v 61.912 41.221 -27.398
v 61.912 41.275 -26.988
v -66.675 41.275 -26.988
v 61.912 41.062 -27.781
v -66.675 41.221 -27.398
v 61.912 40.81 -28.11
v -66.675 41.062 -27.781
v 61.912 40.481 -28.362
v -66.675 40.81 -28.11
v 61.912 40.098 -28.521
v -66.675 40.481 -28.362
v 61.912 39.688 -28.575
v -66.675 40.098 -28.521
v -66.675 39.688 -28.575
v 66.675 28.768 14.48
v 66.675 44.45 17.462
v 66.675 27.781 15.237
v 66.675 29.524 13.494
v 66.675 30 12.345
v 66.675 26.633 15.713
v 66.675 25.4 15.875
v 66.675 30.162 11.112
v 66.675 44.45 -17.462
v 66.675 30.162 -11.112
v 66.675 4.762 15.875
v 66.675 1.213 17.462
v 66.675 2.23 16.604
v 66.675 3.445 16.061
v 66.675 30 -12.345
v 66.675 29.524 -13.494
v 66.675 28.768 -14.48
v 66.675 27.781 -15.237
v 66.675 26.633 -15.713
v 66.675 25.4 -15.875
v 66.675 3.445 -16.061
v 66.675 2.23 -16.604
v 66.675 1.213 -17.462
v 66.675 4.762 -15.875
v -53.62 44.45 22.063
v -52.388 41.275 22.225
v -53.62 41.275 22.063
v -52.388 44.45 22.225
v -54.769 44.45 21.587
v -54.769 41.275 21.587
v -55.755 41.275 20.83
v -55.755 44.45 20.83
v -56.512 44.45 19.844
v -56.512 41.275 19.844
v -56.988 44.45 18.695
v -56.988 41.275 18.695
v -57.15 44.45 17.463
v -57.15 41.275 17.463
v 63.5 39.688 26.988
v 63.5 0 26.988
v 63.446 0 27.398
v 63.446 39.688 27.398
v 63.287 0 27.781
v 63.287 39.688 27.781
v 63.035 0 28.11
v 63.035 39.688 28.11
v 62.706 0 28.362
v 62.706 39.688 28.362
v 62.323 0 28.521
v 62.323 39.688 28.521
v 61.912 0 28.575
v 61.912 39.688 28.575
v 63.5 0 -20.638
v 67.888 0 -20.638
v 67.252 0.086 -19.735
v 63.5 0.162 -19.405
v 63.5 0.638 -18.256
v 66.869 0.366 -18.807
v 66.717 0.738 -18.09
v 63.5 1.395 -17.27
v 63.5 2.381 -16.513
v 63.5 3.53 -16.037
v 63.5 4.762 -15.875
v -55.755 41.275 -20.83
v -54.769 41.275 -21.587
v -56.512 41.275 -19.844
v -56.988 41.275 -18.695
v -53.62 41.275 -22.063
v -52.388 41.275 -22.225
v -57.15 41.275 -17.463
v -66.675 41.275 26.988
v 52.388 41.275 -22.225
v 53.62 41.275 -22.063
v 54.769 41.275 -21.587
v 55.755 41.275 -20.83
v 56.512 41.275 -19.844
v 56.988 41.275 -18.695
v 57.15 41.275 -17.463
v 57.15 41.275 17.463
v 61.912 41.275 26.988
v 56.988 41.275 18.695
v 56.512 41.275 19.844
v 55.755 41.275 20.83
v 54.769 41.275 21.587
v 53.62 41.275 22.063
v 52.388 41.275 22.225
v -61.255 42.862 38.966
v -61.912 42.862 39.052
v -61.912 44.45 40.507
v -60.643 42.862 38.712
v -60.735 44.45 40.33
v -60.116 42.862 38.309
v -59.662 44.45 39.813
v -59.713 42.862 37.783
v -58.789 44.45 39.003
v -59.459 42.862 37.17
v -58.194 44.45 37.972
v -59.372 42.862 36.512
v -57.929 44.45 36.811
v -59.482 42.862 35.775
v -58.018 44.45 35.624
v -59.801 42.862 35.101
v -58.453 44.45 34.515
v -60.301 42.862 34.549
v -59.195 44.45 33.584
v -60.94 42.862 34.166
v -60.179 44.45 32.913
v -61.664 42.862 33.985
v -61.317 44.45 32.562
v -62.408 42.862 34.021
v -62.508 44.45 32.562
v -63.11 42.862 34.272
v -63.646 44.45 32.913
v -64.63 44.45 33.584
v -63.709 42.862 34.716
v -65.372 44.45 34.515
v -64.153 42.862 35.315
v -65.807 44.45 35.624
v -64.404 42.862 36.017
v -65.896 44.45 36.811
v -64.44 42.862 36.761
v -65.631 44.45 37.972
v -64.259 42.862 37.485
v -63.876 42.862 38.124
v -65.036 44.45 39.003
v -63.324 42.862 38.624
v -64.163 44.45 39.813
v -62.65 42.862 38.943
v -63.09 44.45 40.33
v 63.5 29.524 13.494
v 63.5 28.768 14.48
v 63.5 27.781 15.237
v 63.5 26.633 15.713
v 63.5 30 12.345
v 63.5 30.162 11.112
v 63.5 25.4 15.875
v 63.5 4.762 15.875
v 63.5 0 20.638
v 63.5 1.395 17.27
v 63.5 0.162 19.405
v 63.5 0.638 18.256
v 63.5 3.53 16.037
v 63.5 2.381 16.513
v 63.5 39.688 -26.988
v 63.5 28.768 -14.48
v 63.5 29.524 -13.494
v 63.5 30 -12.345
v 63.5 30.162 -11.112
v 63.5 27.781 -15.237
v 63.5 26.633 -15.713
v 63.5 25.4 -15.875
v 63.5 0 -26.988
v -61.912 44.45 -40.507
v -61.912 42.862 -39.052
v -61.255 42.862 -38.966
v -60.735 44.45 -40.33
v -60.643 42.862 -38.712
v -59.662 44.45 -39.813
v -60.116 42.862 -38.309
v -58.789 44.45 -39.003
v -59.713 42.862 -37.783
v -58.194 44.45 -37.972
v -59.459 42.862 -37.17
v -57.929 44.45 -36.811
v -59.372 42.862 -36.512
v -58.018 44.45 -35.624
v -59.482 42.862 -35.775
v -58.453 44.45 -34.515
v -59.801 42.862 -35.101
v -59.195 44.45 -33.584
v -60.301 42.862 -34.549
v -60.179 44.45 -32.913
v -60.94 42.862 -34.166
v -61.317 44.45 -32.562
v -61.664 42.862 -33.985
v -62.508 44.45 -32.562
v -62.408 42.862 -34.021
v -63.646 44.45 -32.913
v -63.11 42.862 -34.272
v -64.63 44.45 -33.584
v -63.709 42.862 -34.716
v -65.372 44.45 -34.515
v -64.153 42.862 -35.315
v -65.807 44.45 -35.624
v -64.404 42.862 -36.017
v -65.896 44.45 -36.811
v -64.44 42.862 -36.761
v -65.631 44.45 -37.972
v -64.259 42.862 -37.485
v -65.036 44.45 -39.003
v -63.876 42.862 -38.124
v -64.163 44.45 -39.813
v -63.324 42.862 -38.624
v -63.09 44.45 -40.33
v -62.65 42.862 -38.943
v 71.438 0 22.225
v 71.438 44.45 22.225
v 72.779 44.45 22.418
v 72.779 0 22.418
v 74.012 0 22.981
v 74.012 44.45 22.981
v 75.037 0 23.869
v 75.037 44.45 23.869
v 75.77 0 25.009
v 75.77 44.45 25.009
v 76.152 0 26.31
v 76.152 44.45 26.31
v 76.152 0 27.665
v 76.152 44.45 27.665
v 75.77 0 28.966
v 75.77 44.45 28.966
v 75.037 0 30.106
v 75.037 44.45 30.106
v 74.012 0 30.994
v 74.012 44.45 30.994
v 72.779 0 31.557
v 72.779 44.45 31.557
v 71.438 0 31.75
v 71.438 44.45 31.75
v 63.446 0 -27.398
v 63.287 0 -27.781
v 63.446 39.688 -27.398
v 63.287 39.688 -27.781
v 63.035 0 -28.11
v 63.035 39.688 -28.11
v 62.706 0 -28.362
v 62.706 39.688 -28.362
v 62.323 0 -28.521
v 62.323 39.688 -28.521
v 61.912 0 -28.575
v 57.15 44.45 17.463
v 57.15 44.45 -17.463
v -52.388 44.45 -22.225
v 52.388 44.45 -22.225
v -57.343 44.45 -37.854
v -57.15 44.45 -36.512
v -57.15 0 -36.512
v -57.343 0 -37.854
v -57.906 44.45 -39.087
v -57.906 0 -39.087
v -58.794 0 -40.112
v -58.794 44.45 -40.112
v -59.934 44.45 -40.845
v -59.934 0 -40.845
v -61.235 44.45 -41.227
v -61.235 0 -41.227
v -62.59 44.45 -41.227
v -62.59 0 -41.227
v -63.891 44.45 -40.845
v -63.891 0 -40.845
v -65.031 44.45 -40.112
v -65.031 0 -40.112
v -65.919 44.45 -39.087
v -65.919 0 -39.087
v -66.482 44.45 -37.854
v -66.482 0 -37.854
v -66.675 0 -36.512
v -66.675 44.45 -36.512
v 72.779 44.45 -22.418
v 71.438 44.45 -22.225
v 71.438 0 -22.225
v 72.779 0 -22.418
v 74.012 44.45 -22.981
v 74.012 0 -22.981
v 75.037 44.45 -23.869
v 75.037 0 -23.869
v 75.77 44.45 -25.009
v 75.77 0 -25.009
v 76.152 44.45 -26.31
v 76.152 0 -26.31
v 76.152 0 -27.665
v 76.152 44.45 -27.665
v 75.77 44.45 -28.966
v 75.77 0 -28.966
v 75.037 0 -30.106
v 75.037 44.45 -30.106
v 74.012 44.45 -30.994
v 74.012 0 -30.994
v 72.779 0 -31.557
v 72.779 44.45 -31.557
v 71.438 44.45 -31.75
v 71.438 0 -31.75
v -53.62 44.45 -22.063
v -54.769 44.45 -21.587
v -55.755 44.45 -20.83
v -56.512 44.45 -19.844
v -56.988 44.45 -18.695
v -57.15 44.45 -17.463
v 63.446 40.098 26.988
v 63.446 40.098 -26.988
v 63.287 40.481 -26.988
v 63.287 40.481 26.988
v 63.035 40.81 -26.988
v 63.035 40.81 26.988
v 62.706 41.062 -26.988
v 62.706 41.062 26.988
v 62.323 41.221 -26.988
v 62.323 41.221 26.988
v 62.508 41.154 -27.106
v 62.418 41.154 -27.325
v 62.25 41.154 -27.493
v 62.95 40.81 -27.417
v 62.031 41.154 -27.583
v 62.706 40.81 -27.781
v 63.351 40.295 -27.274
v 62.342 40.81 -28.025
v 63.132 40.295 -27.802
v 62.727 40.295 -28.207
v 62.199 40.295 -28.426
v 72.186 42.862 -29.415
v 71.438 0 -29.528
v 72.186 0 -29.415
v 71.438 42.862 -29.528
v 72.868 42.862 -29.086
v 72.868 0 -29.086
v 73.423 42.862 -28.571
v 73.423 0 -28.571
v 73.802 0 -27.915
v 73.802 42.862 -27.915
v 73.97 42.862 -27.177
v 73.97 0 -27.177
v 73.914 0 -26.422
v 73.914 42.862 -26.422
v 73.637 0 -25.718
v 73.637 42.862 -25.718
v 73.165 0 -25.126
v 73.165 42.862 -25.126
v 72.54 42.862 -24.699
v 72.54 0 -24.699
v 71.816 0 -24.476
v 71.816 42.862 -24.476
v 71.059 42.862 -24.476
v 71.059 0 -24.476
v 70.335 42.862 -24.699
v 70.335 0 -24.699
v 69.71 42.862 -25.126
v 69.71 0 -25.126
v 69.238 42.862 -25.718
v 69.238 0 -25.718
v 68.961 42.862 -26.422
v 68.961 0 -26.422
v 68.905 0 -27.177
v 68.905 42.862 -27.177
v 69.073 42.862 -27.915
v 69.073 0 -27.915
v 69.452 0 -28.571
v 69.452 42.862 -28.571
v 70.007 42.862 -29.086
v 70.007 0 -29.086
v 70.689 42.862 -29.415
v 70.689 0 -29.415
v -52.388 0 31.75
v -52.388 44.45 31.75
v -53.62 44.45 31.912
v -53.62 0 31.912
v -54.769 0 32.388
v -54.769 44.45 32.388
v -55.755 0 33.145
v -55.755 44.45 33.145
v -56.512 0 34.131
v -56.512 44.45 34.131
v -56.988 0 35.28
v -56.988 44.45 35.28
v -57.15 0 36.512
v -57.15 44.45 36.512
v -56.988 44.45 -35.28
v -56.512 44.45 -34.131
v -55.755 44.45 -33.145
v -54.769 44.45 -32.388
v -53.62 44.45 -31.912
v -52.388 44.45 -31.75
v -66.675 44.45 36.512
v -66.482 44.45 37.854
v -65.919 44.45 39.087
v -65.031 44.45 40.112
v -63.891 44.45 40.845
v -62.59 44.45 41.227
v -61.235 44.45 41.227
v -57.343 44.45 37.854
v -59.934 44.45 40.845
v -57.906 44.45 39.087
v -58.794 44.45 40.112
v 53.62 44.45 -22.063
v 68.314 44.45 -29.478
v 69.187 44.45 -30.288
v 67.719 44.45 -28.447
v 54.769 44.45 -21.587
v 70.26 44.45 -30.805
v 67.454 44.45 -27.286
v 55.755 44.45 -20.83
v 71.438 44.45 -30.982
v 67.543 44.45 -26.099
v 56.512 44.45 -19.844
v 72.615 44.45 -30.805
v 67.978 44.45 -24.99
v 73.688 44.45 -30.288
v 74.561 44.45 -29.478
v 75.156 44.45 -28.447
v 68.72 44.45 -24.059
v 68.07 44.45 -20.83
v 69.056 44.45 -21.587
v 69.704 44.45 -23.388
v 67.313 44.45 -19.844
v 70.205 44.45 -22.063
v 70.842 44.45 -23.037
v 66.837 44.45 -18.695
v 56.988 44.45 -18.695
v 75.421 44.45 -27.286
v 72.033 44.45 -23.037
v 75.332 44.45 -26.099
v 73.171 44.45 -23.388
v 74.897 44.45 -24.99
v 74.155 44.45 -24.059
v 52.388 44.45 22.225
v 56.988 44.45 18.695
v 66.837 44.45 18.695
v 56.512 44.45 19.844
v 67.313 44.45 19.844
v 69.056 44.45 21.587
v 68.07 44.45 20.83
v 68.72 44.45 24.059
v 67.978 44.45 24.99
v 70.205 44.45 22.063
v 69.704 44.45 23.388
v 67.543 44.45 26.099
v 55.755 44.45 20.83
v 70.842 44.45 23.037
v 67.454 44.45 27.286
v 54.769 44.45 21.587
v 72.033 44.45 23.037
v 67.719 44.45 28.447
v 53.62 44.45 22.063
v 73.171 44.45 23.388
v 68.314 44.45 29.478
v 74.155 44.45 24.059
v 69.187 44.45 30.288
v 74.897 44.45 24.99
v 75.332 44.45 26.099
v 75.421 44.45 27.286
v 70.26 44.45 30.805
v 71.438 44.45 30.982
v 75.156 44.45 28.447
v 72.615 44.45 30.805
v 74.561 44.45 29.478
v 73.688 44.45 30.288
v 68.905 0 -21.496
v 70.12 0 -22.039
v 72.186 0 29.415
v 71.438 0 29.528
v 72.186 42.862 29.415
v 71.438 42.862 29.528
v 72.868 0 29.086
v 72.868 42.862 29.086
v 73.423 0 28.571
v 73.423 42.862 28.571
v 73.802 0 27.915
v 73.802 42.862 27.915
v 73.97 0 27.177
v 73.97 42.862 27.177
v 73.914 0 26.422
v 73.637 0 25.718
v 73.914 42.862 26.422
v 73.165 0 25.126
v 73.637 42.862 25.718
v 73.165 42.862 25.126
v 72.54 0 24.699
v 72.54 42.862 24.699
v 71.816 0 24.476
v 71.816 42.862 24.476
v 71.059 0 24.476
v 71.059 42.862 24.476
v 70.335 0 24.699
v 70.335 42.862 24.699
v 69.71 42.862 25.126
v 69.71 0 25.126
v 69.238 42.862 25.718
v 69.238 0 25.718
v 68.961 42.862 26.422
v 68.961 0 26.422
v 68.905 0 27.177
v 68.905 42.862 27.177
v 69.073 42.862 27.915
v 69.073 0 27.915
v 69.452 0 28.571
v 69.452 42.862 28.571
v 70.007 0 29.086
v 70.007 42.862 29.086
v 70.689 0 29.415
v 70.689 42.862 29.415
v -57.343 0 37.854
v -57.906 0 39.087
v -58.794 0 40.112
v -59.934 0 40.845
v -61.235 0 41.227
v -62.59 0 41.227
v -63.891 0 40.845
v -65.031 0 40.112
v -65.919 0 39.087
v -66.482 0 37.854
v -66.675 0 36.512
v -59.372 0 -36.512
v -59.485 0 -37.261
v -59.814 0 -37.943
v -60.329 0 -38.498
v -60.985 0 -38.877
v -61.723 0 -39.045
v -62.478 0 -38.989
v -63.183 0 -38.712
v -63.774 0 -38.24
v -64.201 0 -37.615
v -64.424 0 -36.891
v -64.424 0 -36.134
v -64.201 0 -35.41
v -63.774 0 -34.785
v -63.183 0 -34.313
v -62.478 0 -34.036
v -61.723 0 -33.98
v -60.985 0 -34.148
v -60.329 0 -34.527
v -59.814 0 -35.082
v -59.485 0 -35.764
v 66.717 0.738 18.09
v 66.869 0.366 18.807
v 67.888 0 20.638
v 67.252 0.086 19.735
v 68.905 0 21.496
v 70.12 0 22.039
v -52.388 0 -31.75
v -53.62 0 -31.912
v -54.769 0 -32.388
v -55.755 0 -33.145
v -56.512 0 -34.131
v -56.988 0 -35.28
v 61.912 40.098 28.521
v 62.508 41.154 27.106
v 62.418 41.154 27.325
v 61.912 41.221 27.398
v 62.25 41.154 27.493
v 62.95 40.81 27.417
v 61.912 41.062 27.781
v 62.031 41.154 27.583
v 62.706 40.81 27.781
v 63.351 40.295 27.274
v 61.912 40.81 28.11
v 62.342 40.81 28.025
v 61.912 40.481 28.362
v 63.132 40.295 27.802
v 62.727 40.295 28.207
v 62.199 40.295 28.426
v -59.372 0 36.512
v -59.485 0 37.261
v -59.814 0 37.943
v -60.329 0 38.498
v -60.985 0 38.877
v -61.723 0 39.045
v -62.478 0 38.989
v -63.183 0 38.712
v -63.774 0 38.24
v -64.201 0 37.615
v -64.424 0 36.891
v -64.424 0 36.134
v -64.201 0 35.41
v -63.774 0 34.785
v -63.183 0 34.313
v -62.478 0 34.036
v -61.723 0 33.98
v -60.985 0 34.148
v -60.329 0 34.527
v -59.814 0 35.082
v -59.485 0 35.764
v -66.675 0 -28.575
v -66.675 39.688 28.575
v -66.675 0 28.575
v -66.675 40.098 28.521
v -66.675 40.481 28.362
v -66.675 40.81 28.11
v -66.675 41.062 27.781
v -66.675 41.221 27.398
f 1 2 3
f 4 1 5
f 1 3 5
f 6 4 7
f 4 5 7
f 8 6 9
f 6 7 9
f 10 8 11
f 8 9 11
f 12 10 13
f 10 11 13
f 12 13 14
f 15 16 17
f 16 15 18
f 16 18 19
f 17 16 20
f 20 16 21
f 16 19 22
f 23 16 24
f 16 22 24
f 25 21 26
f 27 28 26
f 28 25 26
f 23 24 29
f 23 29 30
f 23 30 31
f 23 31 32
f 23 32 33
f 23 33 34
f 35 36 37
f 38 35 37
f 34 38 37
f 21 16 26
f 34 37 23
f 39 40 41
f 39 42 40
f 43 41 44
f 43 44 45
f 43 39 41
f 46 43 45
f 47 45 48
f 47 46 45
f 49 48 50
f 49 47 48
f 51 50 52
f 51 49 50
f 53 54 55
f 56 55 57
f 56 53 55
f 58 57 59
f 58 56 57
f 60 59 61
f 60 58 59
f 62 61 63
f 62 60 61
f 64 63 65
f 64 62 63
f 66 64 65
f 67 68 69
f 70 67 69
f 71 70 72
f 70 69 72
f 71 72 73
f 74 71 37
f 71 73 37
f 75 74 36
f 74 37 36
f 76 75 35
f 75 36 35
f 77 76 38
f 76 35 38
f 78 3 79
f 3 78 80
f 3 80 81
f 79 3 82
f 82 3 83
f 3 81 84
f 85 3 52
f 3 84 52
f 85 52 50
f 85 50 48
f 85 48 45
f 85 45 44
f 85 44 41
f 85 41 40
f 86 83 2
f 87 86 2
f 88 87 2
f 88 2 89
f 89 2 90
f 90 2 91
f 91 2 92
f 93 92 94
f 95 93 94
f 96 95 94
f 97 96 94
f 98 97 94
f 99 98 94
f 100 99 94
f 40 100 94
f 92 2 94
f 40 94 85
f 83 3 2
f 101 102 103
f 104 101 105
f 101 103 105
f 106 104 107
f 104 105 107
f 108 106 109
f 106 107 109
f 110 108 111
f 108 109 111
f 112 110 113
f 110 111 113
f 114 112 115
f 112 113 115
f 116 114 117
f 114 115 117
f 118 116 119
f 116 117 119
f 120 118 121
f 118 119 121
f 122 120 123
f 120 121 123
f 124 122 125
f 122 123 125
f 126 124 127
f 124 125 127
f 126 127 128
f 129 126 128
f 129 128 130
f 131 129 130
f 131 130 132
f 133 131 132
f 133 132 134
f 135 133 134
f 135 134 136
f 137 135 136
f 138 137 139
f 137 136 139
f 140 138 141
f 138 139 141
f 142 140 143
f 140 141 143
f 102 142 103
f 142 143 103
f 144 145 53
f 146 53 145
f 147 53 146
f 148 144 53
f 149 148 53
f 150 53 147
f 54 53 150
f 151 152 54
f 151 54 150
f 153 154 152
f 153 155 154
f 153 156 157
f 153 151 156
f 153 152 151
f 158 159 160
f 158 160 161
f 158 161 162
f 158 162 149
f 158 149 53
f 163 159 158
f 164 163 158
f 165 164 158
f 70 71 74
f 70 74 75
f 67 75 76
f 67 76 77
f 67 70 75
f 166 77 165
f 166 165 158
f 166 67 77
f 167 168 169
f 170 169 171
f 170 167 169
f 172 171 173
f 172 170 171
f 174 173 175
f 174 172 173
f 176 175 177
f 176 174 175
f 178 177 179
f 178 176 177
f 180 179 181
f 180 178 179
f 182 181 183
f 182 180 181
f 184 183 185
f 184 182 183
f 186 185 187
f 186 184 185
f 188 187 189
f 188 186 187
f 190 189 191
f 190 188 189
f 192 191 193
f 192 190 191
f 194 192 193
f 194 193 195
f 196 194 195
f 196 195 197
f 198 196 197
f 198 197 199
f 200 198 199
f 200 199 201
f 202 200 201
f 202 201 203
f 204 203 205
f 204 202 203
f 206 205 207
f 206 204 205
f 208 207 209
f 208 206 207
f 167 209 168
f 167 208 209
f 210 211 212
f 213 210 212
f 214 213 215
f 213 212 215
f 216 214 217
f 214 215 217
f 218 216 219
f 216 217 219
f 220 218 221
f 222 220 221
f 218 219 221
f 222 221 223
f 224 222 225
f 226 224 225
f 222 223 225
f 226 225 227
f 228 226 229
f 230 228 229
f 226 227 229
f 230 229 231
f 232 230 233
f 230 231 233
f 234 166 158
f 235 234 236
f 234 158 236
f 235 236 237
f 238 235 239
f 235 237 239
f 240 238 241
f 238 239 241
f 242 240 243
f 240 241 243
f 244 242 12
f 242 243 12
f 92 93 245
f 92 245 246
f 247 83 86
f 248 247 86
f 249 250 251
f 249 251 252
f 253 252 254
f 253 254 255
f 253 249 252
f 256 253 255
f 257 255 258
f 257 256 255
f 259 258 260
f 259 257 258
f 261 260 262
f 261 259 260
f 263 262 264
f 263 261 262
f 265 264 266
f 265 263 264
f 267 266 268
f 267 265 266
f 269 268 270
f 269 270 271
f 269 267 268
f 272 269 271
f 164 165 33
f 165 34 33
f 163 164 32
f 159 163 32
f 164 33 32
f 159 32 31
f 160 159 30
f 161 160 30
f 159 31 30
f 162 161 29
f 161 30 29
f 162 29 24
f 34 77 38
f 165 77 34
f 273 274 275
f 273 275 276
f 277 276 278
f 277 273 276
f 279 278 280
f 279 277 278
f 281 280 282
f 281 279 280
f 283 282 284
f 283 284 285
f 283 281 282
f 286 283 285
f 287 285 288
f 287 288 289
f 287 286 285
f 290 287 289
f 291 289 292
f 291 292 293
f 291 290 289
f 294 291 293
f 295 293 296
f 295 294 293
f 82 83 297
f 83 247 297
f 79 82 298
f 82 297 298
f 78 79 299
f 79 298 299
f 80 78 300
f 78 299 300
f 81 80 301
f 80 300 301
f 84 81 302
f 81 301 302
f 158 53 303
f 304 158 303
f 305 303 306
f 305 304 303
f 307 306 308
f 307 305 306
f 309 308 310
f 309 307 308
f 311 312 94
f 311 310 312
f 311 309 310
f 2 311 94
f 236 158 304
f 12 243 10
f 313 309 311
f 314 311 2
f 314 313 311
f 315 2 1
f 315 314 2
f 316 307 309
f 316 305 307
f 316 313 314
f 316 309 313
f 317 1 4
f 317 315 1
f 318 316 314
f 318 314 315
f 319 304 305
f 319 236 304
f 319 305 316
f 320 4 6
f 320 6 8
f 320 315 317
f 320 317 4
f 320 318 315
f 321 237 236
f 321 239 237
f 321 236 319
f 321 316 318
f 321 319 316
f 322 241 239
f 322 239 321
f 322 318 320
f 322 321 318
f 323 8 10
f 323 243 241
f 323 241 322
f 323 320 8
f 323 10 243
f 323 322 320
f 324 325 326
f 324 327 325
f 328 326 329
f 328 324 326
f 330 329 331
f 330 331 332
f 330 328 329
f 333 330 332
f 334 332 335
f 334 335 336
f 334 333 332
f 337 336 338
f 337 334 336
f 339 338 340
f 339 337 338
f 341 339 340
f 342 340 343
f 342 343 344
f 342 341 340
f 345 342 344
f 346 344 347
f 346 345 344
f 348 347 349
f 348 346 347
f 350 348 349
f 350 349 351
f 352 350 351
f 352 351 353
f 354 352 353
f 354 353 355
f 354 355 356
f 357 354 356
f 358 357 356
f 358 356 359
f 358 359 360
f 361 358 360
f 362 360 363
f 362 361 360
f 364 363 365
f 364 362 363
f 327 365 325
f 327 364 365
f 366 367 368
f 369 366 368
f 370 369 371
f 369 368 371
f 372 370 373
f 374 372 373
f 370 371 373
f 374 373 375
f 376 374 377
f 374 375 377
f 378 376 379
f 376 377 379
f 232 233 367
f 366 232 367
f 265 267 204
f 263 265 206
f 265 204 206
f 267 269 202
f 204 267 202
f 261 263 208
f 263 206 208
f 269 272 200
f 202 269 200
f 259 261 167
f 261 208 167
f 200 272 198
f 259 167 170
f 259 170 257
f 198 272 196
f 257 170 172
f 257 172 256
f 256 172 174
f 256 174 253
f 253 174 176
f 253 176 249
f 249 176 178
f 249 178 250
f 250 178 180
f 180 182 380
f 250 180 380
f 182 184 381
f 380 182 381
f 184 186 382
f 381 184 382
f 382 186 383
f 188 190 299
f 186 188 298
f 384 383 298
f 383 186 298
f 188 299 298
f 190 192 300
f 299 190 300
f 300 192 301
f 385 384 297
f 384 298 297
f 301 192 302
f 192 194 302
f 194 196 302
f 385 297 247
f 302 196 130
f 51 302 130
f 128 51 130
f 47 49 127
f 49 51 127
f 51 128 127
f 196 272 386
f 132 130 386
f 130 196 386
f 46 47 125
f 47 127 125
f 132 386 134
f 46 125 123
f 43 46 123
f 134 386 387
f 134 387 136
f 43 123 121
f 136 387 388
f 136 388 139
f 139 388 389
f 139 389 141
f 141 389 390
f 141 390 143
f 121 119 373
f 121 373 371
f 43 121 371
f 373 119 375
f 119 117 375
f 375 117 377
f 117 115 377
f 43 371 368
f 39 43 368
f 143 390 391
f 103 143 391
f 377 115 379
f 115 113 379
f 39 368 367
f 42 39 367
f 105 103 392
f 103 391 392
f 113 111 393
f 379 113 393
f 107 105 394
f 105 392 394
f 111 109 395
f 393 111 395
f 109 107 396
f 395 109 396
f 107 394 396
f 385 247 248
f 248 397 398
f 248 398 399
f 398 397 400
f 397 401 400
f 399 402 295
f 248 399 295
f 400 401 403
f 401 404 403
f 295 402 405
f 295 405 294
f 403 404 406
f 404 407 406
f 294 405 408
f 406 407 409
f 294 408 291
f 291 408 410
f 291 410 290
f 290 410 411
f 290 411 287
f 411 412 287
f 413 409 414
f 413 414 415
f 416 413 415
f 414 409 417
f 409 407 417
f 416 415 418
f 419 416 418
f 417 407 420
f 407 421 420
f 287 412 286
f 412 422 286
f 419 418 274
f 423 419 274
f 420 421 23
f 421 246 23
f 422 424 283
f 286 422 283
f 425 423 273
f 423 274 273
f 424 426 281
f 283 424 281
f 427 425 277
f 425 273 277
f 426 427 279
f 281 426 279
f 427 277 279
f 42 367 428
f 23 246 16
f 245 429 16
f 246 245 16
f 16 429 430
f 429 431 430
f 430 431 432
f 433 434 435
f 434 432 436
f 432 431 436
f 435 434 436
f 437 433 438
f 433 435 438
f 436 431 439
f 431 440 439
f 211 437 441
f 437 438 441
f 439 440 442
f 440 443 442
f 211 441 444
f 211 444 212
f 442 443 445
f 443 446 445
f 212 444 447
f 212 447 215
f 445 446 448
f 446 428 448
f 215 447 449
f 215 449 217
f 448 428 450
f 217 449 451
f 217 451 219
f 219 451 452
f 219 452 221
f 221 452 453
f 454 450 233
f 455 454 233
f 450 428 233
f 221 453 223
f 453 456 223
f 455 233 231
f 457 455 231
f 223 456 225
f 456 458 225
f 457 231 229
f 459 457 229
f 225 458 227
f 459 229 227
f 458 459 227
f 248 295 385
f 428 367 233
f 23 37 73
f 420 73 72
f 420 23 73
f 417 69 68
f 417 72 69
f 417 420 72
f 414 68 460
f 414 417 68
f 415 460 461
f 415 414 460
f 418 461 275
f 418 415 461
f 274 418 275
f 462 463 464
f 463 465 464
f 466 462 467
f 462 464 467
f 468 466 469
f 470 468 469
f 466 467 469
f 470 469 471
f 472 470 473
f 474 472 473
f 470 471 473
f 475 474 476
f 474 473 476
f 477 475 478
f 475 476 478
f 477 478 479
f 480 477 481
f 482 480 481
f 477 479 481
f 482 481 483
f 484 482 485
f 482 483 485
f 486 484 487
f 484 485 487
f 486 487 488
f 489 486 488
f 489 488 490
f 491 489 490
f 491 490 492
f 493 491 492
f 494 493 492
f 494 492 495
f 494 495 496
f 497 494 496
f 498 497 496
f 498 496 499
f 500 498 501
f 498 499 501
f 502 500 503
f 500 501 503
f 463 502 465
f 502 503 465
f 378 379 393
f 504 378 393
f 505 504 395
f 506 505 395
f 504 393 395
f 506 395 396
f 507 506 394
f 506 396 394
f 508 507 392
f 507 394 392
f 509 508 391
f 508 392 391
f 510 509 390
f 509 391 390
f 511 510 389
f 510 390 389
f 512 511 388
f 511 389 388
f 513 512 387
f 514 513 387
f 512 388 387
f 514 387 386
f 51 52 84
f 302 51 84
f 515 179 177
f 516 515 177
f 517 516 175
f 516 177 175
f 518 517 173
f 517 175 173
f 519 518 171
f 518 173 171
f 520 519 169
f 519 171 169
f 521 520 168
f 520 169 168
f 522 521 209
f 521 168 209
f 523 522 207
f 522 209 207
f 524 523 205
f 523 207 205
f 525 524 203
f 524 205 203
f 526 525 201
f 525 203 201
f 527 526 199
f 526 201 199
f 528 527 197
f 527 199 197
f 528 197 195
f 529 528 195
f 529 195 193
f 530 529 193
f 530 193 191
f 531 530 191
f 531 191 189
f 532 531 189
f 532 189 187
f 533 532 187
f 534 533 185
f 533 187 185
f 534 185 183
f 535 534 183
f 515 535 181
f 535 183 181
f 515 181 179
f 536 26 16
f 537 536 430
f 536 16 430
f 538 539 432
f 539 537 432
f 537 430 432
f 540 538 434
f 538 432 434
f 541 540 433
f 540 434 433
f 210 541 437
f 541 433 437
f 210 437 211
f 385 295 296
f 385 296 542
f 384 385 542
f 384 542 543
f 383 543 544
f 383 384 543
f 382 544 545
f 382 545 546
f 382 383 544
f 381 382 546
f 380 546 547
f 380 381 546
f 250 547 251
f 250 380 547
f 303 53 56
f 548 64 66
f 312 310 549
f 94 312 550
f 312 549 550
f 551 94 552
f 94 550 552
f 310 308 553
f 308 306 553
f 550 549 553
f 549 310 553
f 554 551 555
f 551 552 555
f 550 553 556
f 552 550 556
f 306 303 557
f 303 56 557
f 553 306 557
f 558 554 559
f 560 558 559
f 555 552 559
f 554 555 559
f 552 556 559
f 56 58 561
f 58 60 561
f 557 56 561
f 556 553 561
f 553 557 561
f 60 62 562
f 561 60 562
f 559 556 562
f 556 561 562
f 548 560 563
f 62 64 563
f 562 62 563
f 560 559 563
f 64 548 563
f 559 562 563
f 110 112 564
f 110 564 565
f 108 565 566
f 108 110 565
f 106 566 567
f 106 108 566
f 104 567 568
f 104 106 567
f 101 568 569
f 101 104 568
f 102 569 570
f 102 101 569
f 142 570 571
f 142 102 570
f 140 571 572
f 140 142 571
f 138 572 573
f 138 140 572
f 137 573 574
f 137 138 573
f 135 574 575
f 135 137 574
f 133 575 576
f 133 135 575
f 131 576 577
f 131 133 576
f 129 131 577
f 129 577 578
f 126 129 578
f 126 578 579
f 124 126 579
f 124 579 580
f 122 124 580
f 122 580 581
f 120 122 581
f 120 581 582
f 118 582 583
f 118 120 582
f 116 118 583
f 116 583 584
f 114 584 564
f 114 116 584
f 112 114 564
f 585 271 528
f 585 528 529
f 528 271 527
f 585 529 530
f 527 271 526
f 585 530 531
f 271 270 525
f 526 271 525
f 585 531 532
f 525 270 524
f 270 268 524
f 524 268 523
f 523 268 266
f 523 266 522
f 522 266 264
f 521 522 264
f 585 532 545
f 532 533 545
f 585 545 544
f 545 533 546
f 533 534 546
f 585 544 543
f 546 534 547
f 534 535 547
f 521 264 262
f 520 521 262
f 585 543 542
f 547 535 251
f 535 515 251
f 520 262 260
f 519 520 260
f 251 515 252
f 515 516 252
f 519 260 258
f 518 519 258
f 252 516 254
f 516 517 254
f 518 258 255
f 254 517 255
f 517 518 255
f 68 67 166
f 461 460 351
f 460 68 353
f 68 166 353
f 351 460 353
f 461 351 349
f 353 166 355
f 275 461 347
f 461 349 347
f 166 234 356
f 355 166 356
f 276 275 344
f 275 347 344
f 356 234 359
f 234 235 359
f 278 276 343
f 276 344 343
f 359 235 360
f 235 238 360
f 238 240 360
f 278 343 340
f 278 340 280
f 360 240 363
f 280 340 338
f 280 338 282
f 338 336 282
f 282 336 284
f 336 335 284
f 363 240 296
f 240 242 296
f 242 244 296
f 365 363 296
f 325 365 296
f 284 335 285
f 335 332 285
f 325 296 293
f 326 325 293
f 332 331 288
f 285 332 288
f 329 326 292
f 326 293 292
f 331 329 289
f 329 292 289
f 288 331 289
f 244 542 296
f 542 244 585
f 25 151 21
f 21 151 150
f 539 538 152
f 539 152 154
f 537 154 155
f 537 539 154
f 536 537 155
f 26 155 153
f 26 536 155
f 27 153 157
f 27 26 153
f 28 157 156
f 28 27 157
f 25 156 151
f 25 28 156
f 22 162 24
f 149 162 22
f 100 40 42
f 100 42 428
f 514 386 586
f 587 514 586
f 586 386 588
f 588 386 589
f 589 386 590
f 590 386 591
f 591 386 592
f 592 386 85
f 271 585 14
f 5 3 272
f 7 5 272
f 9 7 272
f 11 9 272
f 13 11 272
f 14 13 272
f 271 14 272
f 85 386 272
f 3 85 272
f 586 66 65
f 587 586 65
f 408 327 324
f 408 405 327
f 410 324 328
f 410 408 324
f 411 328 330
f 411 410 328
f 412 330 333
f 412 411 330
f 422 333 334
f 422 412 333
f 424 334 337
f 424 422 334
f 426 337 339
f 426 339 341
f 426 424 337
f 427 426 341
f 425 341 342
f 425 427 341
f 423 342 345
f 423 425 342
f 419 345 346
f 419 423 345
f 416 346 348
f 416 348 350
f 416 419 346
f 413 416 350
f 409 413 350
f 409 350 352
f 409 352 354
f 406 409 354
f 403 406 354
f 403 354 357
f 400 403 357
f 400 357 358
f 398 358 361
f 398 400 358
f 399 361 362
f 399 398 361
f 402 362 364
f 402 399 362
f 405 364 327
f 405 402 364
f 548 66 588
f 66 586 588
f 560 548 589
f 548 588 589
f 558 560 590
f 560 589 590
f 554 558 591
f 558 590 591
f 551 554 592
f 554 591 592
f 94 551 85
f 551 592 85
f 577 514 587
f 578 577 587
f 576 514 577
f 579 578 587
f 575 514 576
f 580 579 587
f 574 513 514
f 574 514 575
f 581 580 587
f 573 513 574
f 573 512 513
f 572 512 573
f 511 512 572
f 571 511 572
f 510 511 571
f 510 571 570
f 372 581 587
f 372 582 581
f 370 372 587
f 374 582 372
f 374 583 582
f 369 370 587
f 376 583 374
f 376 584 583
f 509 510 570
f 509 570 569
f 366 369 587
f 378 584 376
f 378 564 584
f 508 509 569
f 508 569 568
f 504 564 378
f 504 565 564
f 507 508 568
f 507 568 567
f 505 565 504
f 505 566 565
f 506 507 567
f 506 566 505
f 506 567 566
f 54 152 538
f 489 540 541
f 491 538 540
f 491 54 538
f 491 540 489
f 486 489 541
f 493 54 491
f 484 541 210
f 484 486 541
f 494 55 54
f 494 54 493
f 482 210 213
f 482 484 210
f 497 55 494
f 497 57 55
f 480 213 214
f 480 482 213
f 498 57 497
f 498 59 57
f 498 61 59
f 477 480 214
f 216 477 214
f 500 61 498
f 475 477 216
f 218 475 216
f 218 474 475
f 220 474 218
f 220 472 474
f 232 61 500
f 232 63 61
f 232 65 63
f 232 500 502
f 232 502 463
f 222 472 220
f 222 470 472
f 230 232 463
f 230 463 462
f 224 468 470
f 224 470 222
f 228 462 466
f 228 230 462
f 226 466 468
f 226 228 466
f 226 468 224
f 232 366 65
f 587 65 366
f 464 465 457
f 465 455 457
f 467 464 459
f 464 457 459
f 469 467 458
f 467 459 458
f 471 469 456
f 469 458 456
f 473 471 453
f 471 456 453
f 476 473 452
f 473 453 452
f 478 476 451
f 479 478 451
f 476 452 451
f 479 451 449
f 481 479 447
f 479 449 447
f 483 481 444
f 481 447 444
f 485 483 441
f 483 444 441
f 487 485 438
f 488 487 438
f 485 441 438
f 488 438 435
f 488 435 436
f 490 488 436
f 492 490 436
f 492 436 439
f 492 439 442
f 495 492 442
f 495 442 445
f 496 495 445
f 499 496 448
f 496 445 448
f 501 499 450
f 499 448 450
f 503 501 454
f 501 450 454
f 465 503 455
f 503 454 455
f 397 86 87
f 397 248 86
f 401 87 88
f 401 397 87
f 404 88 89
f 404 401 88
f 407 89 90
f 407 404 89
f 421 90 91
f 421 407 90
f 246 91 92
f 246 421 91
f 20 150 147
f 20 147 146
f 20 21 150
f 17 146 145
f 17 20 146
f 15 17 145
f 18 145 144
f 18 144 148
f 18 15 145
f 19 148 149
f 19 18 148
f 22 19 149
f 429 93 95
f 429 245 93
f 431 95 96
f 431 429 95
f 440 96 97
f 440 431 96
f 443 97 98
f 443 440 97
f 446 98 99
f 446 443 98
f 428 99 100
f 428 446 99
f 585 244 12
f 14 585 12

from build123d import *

# Parameters (mm, degrees)
SKETCH1_W           = 133.35
SKETCH1_H           = 63.5
SKETCH1_W_2         = 127
SKETCH1_H_2         = 57.15
BOSS_EXTRUDE1_DEPTH = 41.275
SKETCH2_W           = 31.75
SKETCH2_H           = 60.325
CUT_EXTRUDE1_DEPTH  = 134.35
SKETCH3_W           = 133.35
SKETCH3_H           = 63.5
SKETCH3_W_2         = 114.3
SKETCH3_H_2         = 44.45
BOSS_EXTRUDE2_DEPTH = 3.175
BOSS_EXTRUDE3_DEPTH = 44.45
SKETCH6_R           = 2.54
BOSS_EXTRUDE4_DEPTH = 44.45
CUT_EXTRUDE2_DEPTH  = 4.175
FILLET1_R           = 1.5875
FILLET2_R           = 4.7625


with BuildPart() as part:
    # Sketch1 → Boss-Extrude1 (new body)
    with BuildSketch(Plane(origin=(0, 0, 0), x_dir=(1, 0, 0), z_dir=(0, 1, 0))):
        Rectangle(SKETCH1_W, SKETCH1_H)
        Rectangle(SKETCH1_W_2, SKETCH1_H_2, mode=Mode.SUBTRACT)
    extrude(amount=BOSS_EXTRUDE1_DEPTH)

    # Sketch2 → Cut-Extrude1 (cut, through all)
    with BuildSketch(Plane.ZY.offset(66.675)):
        Rectangle(SKETCH2_W, SKETCH2_H)
    extrude(amount=-CUT_EXTRUDE1_DEPTH, mode=Mode.SUBTRACT)

    # Sketch3 → Boss-Extrude2 (add)
    with BuildSketch(Plane(origin=(0, 41.275, 0), x_dir=(1, 0, 0), z_dir=(0, 1, 0))):
        Rectangle(SKETCH3_W, SKETCH3_H)
        Rectangle(SKETCH3_W_2, SKETCH3_H_2, mode=Mode.SUBTRACT)
    extrude(amount=BOSS_EXTRUDE2_DEPTH)

    # Sketch4 → Boss-Extrude3 (add)
    with BuildSketch(Plane(origin=(0, 44.45, 0), x_dir=(1, 0, 0), z_dir=(0, 1, 0))):
        with BuildLine():
            Line((71.4375, 31.75), (66.675, 31.75))
            Line((66.675, 31.75), (66.675, 17.4625))
            ThreePointArc((66.675, 17.4625), (68.069903955, 20.830096045), (71.4375, 22.225))
            ThreePointArc((71.4375, 22.225), (76.2, 26.9875), (71.4375, 31.75))
        make_face()
    boss_extrude3 = extrude(amount=-BOSS_EXTRUDE3_DEPTH)

    # Sketch5 → Cut-Revolve1 (revolve, cut)
    with BuildSketch(Plane.YZ.offset(71.4375)):
        Polygon((0, -29.5275), (42.8625, -29.5275), (44.45, -30.982175739), (44.45, -26.9875), (0, -26.9875), align=None)
    cut_revolve1 = revolve(axis=Axis((71.4375, 44.45, -26.9875), (0, -1, 0)), mode=Mode.SUBTRACT)

    # Sketch6 → Boss-Extrude4 (add)
    with BuildSketch(Plane(origin=(0, 44.45, 0), x_dir=(1, 0, 0), z_dir=(0, 1, 0))):
        with BuildLine():
            Line((-66.675, 36.5125), (-66.675, 31.75))
            Line((-66.675, 31.75), (-52.3875, 31.75))
            ThreePointArc((-52.3875, 31.75), (-55.755096045, 33.144903955), (-57.15, 36.5125))
            ThreePointArc((-57.15, 36.5125), (-61.9125, 41.275), (-66.675, 36.5125))
        make_face()
        with Locations((-61.9125, 36.5125)):
            Circle(SKETCH6_R, mode=Mode.SUBTRACT)
    boss_extrude4 = extrude(amount=-BOSS_EXTRUDE4_DEPTH)

    # Sketch7 → Cut-Revolve2 (revolve, cut)
    with BuildSketch(Plane(origin=(-61.9125, 0, 0), x_dir=(0, 1, 0), z_dir=(-1, 0, 0))):
        Polygon((42.8625, 39.0525), (44.45, 40.507175739), (44.45, 36.5125), (42.8625, 36.5125), align=None)
    cut_revolve2 = revolve(axis=Axis((-61.9125, 42.8625, -36.5125), (0, -1, 0)), mode=Mode.SUBTRACT)

    # Mirror1: Boss-Extrude3, Cut-Revolve1, Boss-Extrude4, Cut-Revolve2 across plane
    add(boss_extrude3.mirror(Plane.XY))
    add(cut_revolve1.mirror(Plane.XY), mode=Mode.SUBTRACT)
    add(boss_extrude4.mirror(Plane.XY))
    add(cut_revolve2.mirror(Plane.XY), mode=Mode.SUBTRACT)

    # Sketch8 → Cut-Extrude2 (cut, through all)
    with BuildSketch(Plane(origin=(-63.5, 0, 0), x_dir=(0, 0, -1), z_dir=(1, 0, 0))):
        Polygon((-15.875, 0), (-15.875, 30.1625), (15.875, 30.1625), (15.875, 0), (28.575, 0), (28.575, 41.275), (-28.575, 41.275), (-28.575, 0), align=None)
    extrude(amount=-CUT_EXTRUDE2_DEPTH, mode=Mode.SUBTRACT)

    # Fillet1
    fillet1_edges = [part.edges().sort_by_distance(p)[0] for p in [
        (63.5, 20.6375, 28.575),
        (63.5, 20.6375, -28.575),
        (63.5, 41.275, 0),
        (-1.5875, 41.275, -28.575),
        (-1.5875, 41.275, 28.575),
    ]]
    fillet(fillet1_edges, radius=FILLET1_R)

    # Fillet2
    fillet2_edges = [part.edges().sort_by_distance(p)[0] for p in [
        (65.0875, 0, 15.875),
        (65.0875, 30.1625, 15.875),
        (65.0875, 0, -15.875),
        (65.0875, 30.1625, -15.875),
        (-57.15, 42.8625, 22.225),
        (57.15, 42.8625, 22.225),
        (57.15, 42.8625, -22.225),
        (-57.15, 42.8625, -22.225),
    ]]
    fillet(fillet2_edges, radius=FILLET2_R)


solid = part.part
